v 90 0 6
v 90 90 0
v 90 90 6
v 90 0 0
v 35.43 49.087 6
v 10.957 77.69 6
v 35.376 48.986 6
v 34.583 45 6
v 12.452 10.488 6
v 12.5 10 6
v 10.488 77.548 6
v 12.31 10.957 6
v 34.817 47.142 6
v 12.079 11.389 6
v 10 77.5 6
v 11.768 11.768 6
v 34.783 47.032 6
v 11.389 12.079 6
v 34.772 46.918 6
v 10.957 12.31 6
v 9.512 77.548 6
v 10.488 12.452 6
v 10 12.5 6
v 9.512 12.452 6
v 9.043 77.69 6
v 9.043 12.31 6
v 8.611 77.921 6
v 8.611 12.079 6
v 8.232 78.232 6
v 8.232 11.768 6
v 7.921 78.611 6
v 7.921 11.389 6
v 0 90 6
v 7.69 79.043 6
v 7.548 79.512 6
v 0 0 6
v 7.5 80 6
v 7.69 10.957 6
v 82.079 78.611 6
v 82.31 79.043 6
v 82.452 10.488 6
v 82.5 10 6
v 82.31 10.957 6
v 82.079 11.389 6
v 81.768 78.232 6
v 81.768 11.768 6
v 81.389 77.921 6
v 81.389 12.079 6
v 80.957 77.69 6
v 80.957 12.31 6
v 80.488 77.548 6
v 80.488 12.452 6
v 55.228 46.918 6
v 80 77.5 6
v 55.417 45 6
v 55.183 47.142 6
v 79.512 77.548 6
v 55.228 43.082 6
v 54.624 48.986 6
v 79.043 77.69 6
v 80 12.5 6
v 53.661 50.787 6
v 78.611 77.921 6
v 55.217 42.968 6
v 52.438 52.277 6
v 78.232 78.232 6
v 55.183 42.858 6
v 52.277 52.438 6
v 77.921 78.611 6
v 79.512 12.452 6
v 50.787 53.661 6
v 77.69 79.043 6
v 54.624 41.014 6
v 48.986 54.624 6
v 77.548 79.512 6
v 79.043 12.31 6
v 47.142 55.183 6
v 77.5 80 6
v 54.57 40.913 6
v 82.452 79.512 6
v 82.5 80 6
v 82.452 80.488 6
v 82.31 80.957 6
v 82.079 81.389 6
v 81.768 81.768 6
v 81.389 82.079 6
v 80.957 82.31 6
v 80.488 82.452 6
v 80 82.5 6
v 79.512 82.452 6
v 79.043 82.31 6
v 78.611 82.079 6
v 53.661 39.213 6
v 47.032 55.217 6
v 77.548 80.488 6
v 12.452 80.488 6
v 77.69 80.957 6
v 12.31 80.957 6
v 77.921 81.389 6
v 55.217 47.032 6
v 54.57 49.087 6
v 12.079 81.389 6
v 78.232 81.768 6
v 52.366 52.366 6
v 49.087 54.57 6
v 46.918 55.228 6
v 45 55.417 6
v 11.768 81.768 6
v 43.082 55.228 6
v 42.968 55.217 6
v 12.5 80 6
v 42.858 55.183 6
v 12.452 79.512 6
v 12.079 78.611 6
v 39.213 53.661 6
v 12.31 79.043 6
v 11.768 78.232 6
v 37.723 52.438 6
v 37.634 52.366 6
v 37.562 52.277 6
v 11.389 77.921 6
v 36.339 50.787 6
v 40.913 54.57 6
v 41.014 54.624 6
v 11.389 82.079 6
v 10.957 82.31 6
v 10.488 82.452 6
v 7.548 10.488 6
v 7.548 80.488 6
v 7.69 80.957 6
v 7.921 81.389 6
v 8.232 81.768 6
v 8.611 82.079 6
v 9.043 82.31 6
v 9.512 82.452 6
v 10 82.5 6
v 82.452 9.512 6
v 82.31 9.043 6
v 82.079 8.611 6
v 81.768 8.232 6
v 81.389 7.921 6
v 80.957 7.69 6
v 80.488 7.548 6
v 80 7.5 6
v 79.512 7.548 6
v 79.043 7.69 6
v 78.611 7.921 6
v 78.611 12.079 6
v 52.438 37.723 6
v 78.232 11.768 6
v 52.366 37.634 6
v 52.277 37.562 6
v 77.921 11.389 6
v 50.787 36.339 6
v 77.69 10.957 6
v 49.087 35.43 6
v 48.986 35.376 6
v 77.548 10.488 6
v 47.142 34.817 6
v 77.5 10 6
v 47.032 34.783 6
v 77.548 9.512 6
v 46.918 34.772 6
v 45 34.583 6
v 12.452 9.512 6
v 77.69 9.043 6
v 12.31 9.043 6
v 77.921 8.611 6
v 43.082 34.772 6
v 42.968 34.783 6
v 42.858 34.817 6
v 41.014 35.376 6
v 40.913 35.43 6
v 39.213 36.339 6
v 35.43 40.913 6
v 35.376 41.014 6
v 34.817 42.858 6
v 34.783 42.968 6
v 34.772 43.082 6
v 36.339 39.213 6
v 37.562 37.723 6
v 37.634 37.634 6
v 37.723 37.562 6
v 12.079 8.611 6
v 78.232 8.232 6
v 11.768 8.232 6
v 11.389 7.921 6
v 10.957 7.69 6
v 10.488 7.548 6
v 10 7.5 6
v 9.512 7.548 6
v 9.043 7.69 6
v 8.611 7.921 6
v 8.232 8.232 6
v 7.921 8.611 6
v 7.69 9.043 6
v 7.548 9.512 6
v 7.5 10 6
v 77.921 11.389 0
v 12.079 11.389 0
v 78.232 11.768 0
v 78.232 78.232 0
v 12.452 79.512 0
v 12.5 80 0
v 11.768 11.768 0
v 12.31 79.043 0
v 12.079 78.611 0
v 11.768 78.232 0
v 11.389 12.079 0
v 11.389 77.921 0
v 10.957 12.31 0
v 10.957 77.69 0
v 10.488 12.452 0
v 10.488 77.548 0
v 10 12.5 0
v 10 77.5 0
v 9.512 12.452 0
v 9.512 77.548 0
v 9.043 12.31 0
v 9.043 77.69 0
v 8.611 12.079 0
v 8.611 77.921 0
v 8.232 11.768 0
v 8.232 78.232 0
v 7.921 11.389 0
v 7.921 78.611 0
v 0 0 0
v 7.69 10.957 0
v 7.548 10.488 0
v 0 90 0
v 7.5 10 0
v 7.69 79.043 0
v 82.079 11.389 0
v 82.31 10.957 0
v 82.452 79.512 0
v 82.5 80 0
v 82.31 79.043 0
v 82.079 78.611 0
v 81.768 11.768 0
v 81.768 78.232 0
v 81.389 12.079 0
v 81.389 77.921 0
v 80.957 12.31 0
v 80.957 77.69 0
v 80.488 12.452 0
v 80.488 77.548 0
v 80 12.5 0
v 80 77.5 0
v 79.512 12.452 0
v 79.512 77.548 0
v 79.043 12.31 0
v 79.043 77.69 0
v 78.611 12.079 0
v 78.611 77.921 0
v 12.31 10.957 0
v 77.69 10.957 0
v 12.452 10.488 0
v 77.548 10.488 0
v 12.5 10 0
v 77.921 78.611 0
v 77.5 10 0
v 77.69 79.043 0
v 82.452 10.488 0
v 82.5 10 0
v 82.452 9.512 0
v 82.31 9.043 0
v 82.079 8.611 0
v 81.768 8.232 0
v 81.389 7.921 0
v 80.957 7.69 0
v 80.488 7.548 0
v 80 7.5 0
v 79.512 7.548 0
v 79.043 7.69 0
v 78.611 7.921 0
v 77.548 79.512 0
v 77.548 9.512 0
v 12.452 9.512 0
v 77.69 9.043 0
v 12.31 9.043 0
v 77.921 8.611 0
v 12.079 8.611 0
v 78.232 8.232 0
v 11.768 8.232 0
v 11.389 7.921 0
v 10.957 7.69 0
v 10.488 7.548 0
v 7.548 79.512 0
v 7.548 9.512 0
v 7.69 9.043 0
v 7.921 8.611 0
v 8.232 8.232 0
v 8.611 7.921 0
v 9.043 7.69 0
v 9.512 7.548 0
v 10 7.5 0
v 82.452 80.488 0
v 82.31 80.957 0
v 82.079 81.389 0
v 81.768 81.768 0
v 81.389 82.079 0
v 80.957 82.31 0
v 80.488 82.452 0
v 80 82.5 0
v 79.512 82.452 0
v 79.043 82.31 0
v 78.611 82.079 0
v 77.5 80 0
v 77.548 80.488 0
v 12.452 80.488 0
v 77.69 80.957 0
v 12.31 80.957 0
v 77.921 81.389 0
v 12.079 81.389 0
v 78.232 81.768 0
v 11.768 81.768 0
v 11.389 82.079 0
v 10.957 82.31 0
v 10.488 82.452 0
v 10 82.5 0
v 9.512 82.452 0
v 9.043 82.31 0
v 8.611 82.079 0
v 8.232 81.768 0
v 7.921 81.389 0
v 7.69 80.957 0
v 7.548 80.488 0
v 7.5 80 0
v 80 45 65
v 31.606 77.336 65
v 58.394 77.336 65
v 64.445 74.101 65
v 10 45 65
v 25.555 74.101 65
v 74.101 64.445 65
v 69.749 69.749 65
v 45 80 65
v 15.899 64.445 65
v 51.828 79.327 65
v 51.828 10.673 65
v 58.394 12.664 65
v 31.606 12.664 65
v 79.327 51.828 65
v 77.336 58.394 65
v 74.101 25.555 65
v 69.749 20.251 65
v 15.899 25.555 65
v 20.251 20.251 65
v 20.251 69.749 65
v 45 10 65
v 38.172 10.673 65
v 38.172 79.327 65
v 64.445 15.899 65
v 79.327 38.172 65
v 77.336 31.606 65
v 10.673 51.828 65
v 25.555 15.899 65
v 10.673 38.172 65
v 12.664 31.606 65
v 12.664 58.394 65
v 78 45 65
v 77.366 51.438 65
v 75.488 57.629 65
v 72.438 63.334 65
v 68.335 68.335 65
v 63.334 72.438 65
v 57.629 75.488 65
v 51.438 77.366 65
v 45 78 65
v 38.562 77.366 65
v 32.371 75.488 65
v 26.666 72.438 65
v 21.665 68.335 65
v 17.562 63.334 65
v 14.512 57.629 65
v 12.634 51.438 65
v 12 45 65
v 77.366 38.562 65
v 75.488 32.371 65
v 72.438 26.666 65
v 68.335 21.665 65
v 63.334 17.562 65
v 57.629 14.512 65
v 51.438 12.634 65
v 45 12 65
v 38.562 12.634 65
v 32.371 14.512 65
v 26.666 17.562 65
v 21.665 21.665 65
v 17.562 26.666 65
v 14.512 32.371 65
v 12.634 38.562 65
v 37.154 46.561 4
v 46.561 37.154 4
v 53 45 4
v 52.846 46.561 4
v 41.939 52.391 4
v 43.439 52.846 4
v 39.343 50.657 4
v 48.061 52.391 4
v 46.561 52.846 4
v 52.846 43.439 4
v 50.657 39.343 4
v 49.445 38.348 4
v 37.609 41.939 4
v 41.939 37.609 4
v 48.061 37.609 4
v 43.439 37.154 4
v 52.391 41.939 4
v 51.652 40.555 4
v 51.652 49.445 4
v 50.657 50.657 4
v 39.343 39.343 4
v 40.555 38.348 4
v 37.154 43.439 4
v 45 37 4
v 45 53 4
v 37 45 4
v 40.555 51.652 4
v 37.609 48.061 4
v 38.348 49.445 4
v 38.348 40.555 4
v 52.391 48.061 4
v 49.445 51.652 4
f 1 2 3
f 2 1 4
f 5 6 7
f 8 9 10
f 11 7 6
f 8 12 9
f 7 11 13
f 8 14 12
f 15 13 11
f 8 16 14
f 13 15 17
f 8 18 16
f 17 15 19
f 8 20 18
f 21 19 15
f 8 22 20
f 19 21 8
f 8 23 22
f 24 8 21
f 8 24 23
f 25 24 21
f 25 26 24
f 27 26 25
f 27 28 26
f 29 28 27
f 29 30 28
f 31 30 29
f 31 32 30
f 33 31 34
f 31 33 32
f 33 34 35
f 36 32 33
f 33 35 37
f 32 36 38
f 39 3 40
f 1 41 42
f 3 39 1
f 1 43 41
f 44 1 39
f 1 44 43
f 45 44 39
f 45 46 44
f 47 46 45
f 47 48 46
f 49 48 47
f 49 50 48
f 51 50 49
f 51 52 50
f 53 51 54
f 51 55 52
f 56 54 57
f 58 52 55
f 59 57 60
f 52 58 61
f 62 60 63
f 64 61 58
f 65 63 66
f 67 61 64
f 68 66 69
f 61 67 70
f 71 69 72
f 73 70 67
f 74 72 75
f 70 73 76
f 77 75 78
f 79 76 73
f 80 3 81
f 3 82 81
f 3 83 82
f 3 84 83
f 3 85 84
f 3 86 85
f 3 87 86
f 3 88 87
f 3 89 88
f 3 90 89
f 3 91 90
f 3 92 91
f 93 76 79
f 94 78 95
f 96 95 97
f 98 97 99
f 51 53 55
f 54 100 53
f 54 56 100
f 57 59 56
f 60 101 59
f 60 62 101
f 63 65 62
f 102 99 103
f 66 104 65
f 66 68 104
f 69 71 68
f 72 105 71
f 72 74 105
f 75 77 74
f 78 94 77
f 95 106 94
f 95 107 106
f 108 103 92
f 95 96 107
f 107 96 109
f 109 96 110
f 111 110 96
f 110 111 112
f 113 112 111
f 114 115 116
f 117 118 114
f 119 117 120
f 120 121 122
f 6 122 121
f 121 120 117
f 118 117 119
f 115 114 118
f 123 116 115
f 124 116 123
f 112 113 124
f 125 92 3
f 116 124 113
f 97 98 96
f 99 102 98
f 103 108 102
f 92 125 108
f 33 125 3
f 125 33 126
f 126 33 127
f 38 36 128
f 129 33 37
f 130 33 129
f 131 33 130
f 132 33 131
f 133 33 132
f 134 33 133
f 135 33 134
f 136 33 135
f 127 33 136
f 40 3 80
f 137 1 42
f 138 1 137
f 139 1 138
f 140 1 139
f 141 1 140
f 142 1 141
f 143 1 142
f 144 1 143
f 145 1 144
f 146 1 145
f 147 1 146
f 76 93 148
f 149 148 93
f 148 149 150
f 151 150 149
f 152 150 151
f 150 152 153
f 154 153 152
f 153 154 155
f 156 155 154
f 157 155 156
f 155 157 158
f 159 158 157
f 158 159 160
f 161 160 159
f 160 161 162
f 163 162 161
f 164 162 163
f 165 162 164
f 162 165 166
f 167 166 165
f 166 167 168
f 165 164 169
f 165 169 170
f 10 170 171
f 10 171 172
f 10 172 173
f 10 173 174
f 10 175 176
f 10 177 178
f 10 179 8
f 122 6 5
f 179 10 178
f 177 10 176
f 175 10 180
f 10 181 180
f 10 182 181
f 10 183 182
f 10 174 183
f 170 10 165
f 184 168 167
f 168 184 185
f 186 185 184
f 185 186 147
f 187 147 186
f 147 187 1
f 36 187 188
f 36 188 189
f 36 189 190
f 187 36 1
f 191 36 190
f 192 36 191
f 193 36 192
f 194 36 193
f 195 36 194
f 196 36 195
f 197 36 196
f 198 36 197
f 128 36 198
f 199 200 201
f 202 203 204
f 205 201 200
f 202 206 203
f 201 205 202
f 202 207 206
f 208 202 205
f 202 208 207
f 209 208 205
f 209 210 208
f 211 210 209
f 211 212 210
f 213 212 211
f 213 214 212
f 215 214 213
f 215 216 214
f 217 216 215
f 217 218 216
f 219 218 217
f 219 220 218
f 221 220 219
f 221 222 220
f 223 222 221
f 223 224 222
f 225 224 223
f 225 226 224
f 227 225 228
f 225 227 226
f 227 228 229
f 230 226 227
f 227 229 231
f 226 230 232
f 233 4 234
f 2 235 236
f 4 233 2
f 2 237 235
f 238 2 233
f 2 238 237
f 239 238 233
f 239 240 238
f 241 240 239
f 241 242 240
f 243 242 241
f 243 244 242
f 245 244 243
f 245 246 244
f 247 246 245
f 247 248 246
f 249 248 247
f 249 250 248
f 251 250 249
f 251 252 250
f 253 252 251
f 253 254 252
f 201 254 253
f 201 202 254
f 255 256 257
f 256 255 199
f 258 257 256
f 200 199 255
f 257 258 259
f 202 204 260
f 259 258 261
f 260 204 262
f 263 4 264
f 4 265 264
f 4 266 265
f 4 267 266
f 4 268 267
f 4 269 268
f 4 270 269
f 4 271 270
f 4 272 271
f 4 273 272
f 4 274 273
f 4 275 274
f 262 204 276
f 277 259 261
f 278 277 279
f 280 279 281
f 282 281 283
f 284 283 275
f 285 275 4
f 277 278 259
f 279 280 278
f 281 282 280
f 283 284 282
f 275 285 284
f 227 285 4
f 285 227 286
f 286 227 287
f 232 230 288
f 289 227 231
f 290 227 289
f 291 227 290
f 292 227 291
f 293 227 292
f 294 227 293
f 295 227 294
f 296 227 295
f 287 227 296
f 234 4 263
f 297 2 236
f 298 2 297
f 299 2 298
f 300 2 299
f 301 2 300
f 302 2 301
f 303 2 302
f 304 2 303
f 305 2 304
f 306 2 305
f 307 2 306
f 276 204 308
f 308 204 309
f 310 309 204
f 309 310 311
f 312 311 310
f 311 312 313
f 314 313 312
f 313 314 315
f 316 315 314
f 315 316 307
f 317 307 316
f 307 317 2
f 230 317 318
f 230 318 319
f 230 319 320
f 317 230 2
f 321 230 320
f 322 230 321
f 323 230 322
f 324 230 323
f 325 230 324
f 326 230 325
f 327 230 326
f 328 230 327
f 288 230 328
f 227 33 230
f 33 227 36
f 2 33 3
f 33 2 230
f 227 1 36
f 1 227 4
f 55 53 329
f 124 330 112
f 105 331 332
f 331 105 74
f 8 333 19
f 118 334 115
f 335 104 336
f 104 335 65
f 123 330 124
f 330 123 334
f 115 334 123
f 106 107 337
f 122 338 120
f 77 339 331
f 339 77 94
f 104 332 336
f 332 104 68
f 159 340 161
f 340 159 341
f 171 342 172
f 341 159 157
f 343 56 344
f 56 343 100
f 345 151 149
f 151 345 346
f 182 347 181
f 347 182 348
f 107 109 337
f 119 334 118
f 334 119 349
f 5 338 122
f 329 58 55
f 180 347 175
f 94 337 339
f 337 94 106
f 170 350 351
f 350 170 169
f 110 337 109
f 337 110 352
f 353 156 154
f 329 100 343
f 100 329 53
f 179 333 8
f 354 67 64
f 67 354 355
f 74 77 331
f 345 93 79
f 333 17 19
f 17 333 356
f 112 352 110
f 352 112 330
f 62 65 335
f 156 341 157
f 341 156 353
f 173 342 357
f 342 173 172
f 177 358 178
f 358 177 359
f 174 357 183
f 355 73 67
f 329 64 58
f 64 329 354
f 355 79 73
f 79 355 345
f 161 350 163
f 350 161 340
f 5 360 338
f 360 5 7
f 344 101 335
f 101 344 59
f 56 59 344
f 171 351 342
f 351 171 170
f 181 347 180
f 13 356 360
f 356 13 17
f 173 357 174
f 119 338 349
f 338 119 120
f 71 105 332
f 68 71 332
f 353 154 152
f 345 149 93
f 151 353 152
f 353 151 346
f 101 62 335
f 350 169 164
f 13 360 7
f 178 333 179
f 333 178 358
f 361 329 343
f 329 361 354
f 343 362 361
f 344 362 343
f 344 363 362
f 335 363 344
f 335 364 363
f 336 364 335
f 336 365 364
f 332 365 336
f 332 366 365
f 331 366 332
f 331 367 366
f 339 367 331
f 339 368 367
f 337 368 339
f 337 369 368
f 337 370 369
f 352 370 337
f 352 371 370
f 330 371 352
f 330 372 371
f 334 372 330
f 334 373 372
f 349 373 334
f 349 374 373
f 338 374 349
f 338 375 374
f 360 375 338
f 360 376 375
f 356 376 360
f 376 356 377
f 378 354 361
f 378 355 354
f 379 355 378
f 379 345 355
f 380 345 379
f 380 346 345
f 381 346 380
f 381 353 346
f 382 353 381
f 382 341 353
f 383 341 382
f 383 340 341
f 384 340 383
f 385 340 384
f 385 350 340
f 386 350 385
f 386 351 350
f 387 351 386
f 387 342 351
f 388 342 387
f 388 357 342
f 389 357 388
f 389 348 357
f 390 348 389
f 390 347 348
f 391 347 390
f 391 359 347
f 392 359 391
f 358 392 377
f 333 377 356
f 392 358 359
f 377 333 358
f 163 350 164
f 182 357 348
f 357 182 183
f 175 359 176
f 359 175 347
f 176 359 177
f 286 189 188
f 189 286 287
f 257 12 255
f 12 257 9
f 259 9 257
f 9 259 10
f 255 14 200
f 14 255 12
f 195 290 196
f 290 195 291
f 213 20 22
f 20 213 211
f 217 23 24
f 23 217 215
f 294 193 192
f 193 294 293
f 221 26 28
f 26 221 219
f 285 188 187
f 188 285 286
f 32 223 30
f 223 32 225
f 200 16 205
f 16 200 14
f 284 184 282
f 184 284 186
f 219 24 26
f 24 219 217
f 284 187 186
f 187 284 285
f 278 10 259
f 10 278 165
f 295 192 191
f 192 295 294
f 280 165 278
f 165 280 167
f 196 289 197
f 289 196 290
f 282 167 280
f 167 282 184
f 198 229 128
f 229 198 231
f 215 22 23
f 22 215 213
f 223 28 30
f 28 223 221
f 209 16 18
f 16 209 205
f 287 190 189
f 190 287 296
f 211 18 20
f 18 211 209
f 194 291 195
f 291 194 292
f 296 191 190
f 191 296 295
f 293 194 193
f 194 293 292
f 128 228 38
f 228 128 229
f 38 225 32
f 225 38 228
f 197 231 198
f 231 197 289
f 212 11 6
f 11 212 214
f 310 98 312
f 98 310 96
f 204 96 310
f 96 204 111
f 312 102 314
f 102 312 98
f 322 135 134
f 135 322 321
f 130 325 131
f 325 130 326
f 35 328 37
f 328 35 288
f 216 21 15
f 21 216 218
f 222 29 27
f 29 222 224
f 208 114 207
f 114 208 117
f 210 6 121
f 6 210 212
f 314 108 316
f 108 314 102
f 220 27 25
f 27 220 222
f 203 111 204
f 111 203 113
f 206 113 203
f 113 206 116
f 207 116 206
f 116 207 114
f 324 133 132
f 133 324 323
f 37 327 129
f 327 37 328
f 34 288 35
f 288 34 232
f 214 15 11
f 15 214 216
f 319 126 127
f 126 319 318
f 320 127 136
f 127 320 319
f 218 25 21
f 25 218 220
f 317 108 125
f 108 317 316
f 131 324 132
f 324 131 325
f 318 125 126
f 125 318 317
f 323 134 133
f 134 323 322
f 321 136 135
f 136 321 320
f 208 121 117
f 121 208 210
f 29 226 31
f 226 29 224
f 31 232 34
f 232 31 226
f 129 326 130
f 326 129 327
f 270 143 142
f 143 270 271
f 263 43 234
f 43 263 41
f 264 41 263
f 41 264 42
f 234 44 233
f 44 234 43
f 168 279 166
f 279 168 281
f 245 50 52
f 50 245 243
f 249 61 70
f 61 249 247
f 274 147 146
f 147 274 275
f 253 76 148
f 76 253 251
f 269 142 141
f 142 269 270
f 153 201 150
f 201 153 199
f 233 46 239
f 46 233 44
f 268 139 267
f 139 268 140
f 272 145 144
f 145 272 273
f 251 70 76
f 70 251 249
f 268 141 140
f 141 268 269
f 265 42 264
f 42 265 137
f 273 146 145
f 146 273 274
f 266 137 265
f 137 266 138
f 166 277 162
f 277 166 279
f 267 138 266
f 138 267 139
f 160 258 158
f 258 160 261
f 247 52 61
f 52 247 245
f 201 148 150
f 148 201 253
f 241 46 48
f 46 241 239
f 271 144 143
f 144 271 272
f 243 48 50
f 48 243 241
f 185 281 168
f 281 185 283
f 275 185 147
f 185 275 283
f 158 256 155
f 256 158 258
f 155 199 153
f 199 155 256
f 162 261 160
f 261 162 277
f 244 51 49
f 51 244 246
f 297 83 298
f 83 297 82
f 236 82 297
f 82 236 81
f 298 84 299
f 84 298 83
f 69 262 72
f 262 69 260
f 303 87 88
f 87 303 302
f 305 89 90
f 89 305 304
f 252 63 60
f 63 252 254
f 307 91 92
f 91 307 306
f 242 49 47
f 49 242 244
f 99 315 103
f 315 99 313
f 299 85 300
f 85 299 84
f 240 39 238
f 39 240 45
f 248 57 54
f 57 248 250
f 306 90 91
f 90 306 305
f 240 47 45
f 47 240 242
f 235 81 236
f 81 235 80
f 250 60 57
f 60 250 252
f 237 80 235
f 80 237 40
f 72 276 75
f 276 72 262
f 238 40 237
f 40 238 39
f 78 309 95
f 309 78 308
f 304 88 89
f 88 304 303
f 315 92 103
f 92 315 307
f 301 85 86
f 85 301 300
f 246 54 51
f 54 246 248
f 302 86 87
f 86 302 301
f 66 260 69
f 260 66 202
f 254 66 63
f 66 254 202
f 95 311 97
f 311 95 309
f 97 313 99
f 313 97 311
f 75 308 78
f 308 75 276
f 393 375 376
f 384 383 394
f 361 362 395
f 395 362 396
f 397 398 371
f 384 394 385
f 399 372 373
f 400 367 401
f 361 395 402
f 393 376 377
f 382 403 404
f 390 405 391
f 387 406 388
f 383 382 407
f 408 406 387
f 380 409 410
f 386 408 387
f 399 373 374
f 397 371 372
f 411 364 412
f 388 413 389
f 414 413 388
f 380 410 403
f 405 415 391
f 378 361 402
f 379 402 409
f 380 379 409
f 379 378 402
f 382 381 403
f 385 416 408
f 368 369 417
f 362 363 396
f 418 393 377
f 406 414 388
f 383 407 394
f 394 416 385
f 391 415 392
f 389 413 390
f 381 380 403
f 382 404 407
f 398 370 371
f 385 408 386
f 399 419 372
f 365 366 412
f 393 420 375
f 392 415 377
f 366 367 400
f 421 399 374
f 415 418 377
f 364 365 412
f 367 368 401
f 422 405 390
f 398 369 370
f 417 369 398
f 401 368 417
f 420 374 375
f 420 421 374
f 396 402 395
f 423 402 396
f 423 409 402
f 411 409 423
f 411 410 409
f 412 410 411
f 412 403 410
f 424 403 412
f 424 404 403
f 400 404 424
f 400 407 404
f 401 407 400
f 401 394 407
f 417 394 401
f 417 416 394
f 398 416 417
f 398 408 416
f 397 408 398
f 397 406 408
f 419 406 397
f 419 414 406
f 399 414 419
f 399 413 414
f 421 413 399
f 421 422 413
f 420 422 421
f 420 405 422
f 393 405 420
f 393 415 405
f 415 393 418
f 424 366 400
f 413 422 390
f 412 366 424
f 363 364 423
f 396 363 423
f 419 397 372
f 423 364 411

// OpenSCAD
$fn = 32;

// ----------------------------------------------------------------------
// Hopper: flanged with square flange
// ----------------------------------------------------------------------

// --- parameters (mm) ---
fl = 90;                  // flange side, X and Y
fl_t = 6;                 // flange thickness
cone_h = 60;              // cone height above the flange
top_d = 70;               // cone mouth diameter
bot_d = 20;               // cone spout diameter
wall = 2;                 // cone wall thickness
hole_r = 2.5;             // flange hole radius
hole_in = 10;             // hole inset from the corners
fit_tol = 0.1;            // tolerance for press fits, mm
free_tol = 0.3;           // tolerance for clearance fits, mm

bore_d = bot_d - 2 * wall;  // spout bore diameter
total_h = fl_t + cone_h - 1;  // overall height

difference() {
  union() {
    cube([fl, fl, fl_t]);
    translate([fl / 2, fl / 2, fl_t - 1])
      cylinder(h = cone_h, d1 = bot_d, d2 = top_d);
  }
  translate([fl / 2, fl / 2, fl_t - 2])
    cylinder(h = cone_h + 1, d1 = bore_d, d2 = top_d - 2 * wall);
  for (sx = [0, 1], sy = [0, 1])
    translate([sx ? fl - hole_in : hole_in,
               sy ? fl - hole_in : hole_in, -1])
      cylinder(r = hole_r, h = fl_t + 2);
}
